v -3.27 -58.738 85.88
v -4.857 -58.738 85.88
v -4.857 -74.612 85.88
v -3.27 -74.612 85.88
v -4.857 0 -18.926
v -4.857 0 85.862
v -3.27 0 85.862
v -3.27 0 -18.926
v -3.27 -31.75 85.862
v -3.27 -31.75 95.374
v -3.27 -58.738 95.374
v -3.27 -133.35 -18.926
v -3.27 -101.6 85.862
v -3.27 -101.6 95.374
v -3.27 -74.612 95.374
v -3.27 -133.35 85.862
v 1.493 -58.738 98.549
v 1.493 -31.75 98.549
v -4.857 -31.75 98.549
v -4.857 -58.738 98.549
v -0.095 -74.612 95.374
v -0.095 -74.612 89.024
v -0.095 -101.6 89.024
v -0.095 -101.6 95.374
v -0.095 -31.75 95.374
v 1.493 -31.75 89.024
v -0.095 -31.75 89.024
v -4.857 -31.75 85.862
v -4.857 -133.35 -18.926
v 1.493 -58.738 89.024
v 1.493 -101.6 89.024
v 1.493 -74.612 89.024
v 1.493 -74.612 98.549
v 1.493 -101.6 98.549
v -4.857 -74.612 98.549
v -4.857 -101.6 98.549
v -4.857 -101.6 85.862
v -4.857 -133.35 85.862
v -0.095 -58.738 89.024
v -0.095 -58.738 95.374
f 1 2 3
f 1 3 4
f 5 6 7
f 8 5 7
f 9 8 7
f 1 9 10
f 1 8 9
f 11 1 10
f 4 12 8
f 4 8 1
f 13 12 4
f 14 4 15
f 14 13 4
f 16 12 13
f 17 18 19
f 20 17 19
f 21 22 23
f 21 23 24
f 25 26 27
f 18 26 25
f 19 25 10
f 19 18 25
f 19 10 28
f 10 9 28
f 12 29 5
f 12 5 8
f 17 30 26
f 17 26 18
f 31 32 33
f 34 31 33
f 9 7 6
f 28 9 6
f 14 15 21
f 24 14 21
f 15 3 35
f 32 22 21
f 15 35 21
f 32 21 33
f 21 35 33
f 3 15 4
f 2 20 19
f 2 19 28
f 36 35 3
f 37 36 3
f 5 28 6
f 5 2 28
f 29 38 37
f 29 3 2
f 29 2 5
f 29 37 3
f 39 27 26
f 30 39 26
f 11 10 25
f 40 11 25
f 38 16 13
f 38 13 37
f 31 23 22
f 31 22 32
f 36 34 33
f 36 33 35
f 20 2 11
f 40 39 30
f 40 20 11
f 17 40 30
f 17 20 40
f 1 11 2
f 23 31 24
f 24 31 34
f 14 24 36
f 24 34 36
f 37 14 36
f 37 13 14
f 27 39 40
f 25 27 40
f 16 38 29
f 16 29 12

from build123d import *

# Parameters (mm, degrees)
F0_W     = 1.5875
F0_H     = 12.7
F0_H_2   = 6.35
F0_H_3   = 101.6
F1_DEPTH = 66.675
F3_DEPTH = 7.9375
F5_DEPTH = 31.75


with BuildPart() as f1:
    # F0 (on Front) → F1 (new body)
    with BuildSketch(Plane.XZ):
        Polygon((-4.8573001859, 98.5494344607), (-4.8573001859, 95.3744344607), (-3.2698001859, 95.3744344607), (-0.0948001859, 95.3744344607), (1.4926998141, 95.3744344607), (1.4926998141, 98.5494344607), align=None)
        with Locations((-4.0635501859, 89.0244344607)):
            Rectangle(F0_W, F0_H)
        with Locations((0.6989498141, 92.1994344607)):
            Rectangle(F0_W, F0_H_2)
        with Locations((-4.0635501859, 31.8744344607)):
            Rectangle(F0_W, F0_H_3)
    extrude(amount=F1_DEPTH)

    # F2 (on face) → F3 (cut)
    with BuildSketch(Plane.XZ.offset(66.675)):
        Polygon((-4.8573001859, 98.5494344607), (-4.8573001859, 85.8803465962), (-3.2698001859, 85.8803465962), (-3.2698001859, 95.3744344607), (-0.0948001859, 95.3744344607), (-0.0948001859, 89.0244344607), (1.4926998141, 89.0244344607), (1.4926998141, 98.5494344607), align=None)
    extrude(amount=-F3_DEPTH, mode=Mode.SUBTRACT)

    # F4 (on face) → F5 (cut)
    with BuildSketch(Plane(origin=(0, 0, 0), x_dir=(-1, 0, 0), z_dir=(0, 1, 0))):
        Polygon((3.2698001859, 85.861839354), (4.8573001859, 85.861839354), (4.8573001859, 98.5494344607), (-1.4926998141, 98.5494344607), (-1.4926998141, 89.0244344607), (0.0948001859, 89.0244344607), (0.0948001859, 95.3744344607), (3.2698001859, 95.3744344607), align=None)
    extrude(amount=-F5_DEPTH, mode=Mode.SUBTRACT)

    # F6: F1 across face


with BuildPart() as f1_1:
    add(f1.part)
    add(f1.part.mirror(Plane(origin=(-4.0635501859, -66.675, 33.4773905285), x_dir=(1, 0, 0), z_dir=(0, -1, 0))))


solid = f1_1.part
